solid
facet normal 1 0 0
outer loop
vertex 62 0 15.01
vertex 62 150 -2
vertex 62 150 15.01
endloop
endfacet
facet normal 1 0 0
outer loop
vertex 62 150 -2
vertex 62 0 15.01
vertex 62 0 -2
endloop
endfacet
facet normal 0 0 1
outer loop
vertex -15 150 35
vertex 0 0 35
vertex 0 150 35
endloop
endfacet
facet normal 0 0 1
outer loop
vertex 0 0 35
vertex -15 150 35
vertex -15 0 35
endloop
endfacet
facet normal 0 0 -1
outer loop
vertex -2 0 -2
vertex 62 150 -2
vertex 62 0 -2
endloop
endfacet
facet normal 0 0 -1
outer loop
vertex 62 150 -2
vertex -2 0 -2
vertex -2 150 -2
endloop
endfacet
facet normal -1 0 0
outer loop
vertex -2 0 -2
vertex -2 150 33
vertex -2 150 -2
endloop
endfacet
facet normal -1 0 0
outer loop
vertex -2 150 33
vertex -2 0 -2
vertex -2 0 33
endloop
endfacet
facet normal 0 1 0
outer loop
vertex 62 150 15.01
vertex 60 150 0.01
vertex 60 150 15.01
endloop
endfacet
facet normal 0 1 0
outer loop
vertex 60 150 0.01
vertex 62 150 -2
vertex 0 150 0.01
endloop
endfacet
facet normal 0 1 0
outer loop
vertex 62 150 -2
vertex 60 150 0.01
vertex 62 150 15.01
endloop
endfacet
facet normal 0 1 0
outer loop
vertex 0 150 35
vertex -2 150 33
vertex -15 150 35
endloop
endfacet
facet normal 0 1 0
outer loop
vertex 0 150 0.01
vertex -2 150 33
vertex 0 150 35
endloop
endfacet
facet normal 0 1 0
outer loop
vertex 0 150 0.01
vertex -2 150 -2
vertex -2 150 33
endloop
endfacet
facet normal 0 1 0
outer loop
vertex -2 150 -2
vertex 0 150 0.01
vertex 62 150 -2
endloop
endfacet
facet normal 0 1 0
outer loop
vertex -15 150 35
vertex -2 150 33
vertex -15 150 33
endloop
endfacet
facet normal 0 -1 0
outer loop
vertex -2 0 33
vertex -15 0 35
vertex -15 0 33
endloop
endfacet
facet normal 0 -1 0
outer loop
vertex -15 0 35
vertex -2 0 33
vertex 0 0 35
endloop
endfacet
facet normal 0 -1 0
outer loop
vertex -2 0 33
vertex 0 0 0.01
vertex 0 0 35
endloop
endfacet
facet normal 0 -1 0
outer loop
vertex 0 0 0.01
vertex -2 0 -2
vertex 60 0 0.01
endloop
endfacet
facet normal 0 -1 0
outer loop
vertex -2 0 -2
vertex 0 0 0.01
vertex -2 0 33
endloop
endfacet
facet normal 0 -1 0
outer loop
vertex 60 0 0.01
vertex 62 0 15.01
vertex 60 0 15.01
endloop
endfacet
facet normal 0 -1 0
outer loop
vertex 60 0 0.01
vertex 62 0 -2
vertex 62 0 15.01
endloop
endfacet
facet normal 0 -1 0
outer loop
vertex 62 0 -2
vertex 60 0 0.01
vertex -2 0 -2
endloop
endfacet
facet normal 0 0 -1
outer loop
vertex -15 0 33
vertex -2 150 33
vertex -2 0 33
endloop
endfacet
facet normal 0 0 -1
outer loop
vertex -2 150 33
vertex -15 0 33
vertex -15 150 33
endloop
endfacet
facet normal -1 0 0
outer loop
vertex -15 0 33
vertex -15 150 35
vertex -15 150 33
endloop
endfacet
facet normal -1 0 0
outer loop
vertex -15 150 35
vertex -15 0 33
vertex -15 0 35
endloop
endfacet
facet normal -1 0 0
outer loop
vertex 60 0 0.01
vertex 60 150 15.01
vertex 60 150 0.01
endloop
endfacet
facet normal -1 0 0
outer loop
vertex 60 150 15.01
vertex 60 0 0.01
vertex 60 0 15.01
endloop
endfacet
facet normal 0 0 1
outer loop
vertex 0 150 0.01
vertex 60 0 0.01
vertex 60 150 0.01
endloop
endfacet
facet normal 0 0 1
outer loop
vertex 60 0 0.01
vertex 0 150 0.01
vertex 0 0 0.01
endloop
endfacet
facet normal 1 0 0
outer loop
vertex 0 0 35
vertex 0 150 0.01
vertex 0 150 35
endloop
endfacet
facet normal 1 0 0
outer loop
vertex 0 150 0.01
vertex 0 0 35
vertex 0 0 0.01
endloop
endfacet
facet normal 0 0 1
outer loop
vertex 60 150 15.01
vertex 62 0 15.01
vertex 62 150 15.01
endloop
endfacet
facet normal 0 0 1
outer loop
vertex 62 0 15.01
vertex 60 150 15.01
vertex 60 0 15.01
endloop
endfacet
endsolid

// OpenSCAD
// Holder for laptop charger power brick

width = 60;
height = 35;
depth = 150;

wall_thicc = 2;

difference() {
    union() {
        translate([-wall_thicc, 0, -wall_thicc])
            cube([width + wall_thicc*2, depth, height+wall_thicc]);
        translate([-15, 0, height-wall_thicc])
            cube([width, depth, wall_thicc]);
    }

    // cylinder(height*2, 2, 2);

    translate([0, -0.01, 0.01]) {
        cube([width, depth*2, height]);
        translate([15, 0, 15])
            cube([width, depth*2, height]);
    }
}
